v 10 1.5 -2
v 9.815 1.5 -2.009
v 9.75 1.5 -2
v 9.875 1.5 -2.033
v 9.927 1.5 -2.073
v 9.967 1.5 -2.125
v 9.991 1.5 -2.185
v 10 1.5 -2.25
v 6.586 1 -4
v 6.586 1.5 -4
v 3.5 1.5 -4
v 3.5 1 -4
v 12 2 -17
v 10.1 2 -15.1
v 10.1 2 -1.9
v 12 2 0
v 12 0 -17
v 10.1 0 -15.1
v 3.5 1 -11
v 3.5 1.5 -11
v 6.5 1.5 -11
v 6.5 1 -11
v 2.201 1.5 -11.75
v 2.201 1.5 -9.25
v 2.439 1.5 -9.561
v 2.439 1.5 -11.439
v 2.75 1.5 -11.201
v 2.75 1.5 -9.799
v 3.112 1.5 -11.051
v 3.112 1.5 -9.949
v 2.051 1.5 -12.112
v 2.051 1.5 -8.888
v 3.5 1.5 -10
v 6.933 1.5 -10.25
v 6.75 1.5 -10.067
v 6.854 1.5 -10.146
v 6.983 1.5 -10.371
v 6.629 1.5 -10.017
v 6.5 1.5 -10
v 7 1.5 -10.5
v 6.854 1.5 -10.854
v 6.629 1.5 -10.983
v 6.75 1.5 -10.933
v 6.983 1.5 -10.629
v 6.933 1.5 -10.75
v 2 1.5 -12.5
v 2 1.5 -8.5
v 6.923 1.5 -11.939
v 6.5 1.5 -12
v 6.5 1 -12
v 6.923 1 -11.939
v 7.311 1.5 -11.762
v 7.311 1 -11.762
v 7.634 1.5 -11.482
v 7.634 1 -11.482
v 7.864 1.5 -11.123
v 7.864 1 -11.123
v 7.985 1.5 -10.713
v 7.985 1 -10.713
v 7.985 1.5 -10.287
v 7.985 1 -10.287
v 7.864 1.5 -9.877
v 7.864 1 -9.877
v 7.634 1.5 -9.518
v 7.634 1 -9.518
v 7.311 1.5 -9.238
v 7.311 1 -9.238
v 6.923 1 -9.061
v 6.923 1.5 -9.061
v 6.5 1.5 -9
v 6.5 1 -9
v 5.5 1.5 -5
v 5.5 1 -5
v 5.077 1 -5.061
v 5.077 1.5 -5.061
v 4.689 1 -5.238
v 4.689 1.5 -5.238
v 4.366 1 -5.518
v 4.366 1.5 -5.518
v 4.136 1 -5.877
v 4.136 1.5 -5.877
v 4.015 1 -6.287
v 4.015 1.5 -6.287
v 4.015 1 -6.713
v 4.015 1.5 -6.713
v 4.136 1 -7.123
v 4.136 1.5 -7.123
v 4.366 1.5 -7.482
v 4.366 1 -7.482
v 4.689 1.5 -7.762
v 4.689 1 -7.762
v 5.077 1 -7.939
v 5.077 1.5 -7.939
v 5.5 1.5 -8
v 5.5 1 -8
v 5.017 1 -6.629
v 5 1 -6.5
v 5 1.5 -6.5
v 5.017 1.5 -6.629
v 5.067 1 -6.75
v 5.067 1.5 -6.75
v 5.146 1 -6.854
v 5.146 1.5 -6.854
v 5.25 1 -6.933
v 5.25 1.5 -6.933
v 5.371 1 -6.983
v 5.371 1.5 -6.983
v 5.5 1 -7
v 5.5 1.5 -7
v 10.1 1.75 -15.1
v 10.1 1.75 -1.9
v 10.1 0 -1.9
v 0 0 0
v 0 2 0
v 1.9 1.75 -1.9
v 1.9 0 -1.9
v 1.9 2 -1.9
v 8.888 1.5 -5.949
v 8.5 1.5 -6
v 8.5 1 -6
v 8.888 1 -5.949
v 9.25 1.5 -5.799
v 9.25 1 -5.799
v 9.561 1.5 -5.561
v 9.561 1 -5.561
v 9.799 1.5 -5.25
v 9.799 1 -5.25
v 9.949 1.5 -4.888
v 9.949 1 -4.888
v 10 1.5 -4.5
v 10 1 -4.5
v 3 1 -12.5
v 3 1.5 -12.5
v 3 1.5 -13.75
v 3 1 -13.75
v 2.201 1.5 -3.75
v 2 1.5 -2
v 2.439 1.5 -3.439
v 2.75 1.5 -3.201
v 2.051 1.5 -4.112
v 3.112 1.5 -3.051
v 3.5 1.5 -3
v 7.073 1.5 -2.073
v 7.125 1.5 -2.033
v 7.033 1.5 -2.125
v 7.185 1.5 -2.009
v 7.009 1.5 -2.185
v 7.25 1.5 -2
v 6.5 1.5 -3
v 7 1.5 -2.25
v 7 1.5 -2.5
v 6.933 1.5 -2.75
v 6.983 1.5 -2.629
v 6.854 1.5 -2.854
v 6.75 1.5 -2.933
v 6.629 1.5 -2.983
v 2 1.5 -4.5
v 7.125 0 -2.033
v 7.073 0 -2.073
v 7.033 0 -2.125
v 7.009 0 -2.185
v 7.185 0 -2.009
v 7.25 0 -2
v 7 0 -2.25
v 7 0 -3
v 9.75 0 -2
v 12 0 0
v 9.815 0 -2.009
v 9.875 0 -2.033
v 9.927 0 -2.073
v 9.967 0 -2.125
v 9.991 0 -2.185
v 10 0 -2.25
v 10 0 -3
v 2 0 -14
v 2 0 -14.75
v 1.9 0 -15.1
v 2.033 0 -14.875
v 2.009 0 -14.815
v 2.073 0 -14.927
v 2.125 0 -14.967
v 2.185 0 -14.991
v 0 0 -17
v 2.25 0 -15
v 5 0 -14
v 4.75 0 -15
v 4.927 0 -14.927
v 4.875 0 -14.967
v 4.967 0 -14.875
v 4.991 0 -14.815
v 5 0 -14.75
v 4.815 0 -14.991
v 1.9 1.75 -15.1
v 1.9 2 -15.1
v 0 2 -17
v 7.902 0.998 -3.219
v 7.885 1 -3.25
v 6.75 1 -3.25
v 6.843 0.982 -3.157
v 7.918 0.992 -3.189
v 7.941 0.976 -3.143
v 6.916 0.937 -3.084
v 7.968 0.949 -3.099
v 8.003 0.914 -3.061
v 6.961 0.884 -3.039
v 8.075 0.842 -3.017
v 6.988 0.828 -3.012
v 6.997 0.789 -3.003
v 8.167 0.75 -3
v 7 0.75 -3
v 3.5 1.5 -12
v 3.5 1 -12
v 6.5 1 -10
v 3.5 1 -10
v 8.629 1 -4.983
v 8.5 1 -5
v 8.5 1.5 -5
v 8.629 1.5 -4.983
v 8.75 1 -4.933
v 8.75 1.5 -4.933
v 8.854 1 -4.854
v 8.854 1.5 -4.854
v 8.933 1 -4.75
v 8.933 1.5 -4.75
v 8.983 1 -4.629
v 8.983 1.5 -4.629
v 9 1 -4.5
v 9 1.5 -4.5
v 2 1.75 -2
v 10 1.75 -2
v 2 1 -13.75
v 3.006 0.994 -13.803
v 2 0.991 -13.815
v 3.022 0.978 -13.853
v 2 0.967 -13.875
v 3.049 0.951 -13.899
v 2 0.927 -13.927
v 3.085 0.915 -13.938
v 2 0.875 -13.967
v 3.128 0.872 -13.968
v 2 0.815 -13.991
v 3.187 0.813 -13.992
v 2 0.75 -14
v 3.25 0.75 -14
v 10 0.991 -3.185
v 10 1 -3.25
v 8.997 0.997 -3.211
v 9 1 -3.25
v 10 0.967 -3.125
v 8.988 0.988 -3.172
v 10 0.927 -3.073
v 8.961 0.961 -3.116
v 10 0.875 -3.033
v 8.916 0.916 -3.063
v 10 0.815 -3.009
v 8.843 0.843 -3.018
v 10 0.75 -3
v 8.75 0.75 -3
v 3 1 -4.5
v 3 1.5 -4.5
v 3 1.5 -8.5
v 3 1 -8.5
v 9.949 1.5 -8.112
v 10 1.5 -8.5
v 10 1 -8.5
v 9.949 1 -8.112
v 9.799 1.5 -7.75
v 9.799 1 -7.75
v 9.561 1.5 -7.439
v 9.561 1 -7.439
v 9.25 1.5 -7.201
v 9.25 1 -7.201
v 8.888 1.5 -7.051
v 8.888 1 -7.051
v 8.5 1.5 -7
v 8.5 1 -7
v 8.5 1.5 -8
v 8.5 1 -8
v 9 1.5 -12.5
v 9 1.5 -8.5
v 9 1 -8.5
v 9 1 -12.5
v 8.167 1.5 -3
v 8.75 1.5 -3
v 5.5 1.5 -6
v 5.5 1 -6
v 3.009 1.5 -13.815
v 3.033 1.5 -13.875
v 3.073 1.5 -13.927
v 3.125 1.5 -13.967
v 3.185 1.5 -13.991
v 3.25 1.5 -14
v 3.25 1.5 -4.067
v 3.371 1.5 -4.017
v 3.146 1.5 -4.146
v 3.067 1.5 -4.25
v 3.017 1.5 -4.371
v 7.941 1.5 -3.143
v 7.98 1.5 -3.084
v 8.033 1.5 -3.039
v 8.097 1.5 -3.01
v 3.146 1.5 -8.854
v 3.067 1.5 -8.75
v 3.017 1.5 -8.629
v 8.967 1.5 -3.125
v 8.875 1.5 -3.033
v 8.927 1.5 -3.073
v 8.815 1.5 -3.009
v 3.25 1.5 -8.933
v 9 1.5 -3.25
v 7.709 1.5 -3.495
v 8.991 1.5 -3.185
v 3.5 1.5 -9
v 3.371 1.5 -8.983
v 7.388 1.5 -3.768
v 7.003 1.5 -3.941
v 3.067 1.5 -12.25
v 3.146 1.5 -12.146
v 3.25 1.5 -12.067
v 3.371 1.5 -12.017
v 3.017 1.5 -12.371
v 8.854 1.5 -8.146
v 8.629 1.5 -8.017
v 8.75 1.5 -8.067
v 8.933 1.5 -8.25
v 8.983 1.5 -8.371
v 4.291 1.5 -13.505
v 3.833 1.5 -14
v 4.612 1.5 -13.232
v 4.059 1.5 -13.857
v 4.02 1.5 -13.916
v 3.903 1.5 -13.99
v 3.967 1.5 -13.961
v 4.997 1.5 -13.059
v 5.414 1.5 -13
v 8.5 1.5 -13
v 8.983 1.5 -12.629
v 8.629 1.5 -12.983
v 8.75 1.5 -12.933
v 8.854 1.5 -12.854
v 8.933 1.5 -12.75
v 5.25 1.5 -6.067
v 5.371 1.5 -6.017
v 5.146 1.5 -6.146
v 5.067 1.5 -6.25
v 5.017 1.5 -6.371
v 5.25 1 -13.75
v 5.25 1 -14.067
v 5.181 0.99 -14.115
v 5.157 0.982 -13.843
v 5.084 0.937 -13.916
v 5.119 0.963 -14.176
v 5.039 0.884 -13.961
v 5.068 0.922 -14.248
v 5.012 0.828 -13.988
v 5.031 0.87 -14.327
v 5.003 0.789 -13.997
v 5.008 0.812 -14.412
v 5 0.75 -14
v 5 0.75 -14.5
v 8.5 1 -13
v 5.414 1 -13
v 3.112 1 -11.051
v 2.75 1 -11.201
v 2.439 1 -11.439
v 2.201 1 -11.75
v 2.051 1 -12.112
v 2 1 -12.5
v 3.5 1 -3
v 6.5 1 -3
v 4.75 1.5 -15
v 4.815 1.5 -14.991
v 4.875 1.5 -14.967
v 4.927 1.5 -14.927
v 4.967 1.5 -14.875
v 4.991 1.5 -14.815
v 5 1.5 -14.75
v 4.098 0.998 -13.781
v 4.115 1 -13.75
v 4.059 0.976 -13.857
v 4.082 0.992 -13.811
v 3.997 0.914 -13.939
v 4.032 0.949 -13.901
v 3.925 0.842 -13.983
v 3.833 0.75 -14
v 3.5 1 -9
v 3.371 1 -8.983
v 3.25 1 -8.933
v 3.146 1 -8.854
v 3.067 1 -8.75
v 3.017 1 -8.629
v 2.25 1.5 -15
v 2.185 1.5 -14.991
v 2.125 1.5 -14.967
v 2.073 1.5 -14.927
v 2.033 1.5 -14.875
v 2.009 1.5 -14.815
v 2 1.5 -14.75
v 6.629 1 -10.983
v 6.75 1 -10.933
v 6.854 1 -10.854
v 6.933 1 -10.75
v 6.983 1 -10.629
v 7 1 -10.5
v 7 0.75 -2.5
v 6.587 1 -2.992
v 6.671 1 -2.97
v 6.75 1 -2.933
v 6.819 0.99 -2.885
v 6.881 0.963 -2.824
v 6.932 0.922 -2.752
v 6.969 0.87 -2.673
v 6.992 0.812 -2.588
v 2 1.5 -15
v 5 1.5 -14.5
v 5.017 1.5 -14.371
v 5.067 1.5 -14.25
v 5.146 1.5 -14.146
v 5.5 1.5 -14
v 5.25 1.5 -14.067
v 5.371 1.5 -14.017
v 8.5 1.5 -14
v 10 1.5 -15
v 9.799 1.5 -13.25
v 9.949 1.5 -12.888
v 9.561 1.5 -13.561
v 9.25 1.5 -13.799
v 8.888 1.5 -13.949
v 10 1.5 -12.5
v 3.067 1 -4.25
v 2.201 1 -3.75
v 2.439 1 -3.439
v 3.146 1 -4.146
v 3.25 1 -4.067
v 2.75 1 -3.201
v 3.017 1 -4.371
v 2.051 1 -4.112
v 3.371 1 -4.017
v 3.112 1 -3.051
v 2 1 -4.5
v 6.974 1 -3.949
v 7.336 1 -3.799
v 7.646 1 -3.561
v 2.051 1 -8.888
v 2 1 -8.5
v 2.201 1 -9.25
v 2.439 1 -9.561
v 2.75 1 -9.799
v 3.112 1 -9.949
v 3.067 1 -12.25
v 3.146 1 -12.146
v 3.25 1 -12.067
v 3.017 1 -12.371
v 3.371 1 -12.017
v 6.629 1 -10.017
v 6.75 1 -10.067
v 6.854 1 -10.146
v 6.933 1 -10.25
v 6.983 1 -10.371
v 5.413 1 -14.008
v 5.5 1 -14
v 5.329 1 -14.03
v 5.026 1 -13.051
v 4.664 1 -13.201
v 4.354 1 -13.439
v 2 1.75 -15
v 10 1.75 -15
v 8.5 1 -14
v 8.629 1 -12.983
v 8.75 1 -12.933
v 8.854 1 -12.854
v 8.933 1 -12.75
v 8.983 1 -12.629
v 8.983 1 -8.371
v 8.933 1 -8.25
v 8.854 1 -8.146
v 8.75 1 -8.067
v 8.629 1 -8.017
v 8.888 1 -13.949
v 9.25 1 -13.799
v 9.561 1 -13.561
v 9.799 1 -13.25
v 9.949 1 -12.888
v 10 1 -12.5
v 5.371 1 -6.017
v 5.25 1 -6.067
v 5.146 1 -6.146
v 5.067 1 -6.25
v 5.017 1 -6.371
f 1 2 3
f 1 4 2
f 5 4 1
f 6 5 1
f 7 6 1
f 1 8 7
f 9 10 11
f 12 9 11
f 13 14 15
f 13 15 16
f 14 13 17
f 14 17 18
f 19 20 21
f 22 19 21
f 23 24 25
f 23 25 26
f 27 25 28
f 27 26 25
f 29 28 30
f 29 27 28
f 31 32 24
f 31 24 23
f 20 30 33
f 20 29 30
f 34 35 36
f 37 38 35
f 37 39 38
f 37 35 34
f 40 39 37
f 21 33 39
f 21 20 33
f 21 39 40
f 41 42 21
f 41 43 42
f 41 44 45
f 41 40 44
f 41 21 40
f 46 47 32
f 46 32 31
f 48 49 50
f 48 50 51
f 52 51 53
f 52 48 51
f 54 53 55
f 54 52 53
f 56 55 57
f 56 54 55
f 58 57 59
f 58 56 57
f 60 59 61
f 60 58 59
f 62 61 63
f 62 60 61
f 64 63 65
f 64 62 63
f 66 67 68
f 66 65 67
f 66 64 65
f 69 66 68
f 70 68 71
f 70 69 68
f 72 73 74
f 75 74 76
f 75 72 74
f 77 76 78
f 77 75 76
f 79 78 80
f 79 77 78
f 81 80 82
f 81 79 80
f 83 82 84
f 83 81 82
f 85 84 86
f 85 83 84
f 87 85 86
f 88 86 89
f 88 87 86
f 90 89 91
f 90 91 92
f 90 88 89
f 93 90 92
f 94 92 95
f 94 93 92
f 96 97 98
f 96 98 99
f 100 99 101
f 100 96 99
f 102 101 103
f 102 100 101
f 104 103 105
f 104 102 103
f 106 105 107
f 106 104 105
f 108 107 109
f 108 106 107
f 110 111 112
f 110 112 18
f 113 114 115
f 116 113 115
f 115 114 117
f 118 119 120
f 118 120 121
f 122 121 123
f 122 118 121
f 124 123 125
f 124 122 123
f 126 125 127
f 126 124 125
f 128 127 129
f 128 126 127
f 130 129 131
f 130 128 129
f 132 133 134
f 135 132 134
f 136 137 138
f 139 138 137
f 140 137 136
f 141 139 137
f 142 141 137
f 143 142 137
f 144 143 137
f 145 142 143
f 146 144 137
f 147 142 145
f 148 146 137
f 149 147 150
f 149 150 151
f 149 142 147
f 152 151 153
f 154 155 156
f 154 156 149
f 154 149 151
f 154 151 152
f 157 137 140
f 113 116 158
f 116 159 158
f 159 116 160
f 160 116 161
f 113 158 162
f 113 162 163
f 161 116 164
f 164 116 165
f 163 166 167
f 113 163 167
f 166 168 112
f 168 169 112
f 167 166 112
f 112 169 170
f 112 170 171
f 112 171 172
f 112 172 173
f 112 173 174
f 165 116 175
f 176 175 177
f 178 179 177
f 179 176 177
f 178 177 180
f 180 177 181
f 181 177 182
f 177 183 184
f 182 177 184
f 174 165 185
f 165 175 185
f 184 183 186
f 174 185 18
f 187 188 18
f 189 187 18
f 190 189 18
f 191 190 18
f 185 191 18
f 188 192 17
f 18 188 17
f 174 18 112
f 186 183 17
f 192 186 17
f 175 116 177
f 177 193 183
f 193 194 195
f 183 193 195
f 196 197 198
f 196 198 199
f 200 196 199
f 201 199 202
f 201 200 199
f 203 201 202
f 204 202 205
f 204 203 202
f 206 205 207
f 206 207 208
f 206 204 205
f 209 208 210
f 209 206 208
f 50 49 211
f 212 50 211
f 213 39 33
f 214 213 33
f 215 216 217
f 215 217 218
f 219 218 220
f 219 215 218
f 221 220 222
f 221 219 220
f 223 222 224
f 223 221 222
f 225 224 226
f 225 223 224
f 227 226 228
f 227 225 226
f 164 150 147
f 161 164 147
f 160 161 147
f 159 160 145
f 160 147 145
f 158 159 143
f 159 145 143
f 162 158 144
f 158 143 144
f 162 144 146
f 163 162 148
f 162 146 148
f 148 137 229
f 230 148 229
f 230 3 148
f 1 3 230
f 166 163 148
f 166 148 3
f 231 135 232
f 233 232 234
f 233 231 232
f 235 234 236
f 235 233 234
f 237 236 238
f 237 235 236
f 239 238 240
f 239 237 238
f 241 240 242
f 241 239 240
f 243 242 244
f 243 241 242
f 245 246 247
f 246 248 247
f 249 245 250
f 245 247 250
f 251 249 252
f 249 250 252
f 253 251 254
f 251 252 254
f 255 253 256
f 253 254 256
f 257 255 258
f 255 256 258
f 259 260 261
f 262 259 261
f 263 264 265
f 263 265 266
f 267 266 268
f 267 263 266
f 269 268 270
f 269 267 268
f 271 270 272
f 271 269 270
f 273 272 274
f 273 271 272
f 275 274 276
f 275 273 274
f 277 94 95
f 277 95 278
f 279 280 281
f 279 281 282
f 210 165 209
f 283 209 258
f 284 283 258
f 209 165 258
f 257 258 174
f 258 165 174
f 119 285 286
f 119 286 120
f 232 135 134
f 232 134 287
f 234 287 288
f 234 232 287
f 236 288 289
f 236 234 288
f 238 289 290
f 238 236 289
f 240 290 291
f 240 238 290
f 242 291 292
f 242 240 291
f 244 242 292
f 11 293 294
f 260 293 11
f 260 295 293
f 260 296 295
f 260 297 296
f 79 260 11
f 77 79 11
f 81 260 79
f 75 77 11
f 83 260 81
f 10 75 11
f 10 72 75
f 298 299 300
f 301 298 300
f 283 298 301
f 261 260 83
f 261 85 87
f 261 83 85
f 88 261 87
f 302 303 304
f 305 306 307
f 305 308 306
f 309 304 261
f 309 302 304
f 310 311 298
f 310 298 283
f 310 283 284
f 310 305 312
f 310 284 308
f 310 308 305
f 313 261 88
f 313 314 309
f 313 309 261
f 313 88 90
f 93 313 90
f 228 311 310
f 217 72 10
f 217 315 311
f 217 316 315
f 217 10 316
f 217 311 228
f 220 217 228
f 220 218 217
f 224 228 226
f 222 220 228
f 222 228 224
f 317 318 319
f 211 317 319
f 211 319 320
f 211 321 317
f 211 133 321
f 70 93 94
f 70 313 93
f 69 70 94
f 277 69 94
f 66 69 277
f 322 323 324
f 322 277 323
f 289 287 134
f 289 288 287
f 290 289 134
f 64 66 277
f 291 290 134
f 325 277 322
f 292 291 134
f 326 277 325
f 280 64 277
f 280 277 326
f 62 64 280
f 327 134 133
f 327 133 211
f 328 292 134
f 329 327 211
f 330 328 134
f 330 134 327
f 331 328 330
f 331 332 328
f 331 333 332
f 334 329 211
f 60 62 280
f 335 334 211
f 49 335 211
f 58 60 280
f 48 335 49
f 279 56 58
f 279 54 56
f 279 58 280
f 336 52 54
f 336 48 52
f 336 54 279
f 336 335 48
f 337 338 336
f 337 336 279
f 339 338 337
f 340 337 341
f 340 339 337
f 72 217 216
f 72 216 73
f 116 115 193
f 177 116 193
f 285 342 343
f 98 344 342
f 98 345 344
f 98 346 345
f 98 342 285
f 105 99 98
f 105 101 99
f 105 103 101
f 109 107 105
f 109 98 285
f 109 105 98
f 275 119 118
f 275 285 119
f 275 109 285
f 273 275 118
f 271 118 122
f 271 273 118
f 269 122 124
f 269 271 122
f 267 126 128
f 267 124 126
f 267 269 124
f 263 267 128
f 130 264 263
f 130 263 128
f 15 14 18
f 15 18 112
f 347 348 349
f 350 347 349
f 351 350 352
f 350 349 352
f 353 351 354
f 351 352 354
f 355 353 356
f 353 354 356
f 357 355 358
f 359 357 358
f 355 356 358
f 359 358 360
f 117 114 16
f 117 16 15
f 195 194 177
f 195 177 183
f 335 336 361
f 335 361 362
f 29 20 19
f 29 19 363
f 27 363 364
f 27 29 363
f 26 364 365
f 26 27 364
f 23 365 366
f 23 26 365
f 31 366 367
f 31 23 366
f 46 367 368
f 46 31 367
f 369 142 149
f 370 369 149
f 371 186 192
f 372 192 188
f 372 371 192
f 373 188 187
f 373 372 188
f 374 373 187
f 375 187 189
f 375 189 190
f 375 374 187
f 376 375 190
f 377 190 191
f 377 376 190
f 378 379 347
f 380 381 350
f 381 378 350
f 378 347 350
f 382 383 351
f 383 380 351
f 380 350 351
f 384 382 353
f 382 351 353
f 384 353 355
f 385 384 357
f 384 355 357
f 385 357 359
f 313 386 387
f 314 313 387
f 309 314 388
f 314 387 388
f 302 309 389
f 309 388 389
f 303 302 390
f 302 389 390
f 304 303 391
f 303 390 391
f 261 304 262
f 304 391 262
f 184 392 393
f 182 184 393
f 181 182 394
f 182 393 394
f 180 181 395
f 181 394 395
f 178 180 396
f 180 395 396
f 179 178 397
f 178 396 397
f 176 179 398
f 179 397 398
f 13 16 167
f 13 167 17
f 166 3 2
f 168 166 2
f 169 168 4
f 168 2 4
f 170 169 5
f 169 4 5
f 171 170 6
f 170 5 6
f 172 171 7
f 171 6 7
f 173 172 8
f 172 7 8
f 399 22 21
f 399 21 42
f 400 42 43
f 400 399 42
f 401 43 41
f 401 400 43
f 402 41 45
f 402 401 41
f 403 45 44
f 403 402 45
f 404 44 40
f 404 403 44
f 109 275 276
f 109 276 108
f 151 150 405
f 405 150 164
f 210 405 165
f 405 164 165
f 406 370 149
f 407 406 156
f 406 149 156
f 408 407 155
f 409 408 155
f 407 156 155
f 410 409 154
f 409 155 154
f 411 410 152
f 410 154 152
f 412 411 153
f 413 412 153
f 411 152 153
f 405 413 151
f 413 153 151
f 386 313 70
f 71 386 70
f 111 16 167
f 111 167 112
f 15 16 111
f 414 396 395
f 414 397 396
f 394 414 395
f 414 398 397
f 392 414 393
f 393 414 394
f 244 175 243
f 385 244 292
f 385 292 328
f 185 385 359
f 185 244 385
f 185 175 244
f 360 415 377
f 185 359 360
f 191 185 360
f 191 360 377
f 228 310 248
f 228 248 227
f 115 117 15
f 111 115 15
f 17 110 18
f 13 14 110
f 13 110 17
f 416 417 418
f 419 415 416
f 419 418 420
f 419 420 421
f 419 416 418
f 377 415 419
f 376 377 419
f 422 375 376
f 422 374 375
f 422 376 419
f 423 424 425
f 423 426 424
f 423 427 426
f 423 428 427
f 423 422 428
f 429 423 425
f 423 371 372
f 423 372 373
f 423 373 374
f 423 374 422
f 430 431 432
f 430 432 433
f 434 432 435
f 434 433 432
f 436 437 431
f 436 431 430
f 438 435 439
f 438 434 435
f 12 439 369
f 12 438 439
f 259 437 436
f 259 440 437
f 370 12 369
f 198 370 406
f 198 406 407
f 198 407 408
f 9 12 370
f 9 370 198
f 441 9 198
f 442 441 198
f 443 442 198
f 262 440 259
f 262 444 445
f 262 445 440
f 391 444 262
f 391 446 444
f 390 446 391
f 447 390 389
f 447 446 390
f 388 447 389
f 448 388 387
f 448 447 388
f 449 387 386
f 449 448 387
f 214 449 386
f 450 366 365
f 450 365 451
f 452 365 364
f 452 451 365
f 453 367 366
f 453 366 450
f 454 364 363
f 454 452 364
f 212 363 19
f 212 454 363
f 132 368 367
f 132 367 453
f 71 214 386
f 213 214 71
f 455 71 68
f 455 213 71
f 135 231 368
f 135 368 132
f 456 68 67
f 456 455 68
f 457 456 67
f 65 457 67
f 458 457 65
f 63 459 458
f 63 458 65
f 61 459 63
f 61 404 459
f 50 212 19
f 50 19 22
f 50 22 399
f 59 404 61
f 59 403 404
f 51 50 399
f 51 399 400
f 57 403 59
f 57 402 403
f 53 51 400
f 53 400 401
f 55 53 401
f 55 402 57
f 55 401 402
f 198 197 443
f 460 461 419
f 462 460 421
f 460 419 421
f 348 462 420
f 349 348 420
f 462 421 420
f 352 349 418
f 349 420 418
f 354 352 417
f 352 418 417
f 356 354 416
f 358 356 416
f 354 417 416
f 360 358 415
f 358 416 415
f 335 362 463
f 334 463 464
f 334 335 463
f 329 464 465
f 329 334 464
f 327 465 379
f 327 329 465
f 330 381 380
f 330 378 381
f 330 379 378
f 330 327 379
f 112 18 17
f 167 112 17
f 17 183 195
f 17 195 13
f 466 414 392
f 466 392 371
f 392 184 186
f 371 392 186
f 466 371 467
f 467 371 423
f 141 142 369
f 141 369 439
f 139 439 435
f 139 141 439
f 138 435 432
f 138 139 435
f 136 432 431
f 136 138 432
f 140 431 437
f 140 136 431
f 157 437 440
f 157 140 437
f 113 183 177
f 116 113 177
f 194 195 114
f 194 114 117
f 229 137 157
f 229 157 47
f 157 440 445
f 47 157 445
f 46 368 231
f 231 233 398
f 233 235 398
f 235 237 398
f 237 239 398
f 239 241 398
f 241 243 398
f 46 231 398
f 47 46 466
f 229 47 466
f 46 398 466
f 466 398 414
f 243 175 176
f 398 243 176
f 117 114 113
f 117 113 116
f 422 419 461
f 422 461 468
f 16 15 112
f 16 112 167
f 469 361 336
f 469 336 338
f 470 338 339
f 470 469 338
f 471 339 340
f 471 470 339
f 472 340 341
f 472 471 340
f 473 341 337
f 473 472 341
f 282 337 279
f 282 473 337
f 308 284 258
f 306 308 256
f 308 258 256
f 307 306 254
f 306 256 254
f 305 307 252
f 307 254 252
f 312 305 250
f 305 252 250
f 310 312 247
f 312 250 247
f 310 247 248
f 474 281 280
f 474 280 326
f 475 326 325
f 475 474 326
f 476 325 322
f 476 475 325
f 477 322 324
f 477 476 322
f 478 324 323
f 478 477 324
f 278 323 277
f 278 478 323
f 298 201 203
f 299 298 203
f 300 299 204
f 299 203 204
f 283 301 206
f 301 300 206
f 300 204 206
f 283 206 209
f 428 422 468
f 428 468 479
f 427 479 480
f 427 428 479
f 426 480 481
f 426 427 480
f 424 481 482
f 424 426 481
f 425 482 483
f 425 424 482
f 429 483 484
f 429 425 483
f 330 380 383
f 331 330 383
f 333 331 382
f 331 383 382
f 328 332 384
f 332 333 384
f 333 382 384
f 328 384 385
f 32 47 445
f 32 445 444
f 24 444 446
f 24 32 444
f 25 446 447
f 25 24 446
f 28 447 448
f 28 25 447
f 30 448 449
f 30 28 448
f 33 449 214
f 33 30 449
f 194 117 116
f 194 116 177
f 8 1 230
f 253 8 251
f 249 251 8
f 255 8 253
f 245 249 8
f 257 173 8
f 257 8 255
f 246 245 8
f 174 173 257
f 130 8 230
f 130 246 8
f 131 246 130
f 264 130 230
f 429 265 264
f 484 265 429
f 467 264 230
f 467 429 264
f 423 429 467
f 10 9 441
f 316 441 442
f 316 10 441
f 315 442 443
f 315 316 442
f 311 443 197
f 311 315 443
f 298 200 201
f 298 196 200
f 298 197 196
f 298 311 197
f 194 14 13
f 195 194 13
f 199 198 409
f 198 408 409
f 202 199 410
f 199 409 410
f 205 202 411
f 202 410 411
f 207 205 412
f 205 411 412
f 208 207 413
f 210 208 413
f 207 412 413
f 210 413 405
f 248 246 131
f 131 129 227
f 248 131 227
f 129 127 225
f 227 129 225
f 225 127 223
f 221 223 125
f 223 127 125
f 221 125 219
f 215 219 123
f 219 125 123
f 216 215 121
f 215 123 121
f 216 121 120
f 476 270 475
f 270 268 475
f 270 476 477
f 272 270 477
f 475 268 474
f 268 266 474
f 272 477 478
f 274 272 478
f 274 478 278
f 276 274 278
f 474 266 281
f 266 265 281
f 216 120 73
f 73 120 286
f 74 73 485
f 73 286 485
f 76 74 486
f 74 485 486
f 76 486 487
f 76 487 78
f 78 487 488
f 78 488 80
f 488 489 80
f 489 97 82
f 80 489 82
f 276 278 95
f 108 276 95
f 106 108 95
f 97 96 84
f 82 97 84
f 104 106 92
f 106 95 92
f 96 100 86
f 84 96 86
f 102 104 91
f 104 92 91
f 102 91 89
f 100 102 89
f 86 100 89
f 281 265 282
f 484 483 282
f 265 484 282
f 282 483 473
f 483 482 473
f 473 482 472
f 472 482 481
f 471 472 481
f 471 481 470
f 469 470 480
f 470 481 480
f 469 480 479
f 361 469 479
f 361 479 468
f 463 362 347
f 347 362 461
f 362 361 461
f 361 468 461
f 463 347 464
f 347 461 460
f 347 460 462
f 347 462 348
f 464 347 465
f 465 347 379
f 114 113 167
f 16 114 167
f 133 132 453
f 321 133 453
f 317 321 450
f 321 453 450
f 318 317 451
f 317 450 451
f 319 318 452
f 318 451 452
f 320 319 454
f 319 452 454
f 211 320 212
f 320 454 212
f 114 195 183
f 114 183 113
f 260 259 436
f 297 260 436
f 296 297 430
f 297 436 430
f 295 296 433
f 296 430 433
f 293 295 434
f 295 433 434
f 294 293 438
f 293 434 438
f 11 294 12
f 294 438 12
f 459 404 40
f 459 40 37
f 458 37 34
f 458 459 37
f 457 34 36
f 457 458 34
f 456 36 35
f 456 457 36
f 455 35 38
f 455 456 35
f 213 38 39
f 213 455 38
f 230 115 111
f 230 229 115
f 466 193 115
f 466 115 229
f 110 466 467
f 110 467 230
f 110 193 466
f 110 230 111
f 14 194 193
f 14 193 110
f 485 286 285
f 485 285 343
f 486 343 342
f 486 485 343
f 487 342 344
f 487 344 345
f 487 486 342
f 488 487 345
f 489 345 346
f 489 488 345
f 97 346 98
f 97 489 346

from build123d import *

# Parameters (mm, degrees)
SKIZZE1_W                            = 12
SKIZZE1_H                            = 17
AUFSATZ_LINEAR_AUSTRAGEN1_DEPTH      = 2
SCHNITT_LINEAR_AUSTRAGEN1_DEPTH      = 21.90454496
SCHNITT_LINEAR_AUSTRAGEN1_DEPTH_BACK = 21.90454496
SKIZZE4_W                            = 3
SKIZZE4_H                            = 1
SCHNITT_LINEAR_AUSTRAGEN3_DEPTH      = 1
VERRUNDUNG1_R                        = 0.5
VERRUNDUNG2_R                        = 1.5
VERRUNDUNG3_R                        = 0.25
SKIZZE2_W                            = 8
SKIZZE2_H                            = 13
SCHNITT_LINEAR_AUSTRAGEN4_DEPTH      = 0.5
SKIZZE6_W                            = 8.2
SKIZZE6_H                            = 13.2
SKIZZE6_W_2                          = 8
SKIZZE6_H_2                          = 13
SCHNITT_LINEAR_AUSTRAGEN5_DEPTH      = 0.25
SCHNITT_LINEAR_AUSTRAGEN6_DEPTH      = 21.90454496
AUFSATZ_LINEAR_AUSTRAGEN2_DEPTH      = 2
AUFSATZ_LINEAR_AUSTRAGEN2_2_DEPTH    = 2


# Some blends are built 0.0001 mm under size
with BuildPart() as part:
    # Skizze1 → Aufsatz-Linear austragen1 (new body)
    with BuildSketch(Plane(origin=(0, 0, 0), x_dir=(1, 0, 0), z_dir=(0, 1, 0))):
        with Locations((6, 8.5)):
            Rectangle(SKIZZE1_W, SKIZZE1_H)
    extrude(amount=AUFSATZ_LINEAR_AUSTRAGEN1_DEPTH)

    # Skizze4 → Schnitt-Linear austragen1 (cut, two sides: drawn at the far end of the back side and taken through both)
    with BuildSketch(Plane(origin=(0, 2, 0), x_dir=(1, 0, 0), z_dir=(0, 1, 0)).offset(-SCHNITT_LINEAR_AUSTRAGEN1_DEPTH_BACK)):
        with Locations((8.5, 2.5)):
            Rectangle(SKIZZE4_W, SKIZZE4_H)
        with Locations((3.5, 14.5)):
            Rectangle(SKIZZE4_W, SKIZZE4_H)
    extrude(amount=SCHNITT_LINEAR_AUSTRAGEN1_DEPTH + SCHNITT_LINEAR_AUSTRAGEN1_DEPTH_BACK, mode=Mode.SUBTRACT)

    # Skizze3 → Schnitt-Linear austragen3 (cut)
    with BuildSketch(Plane(origin=(0, 2, 0), x_dir=(1, 0, 0), z_dir=(0, 1, 0))):
        Polygon((8, 4), (3, 4), (3, 9), (8, 9), (8, 12), (3, 12), (3, 14), (2, 14), (2, 11), (7, 11), (7, 10), (2, 10), (2, 3), (8, 3), align=None)
        Polygon((9, 5), (4, 5), (4, 8), (9, 8), (9, 13), (4, 13), (4, 14), (10, 14), (10, 7), (5, 7), (5, 6), (10, 6), (10, 3), (9, 3), align=None)
    extrude(amount=-SCHNITT_LINEAR_AUSTRAGEN3_DEPTH, mode=Mode.SUBTRACT)

    # Verrundung1
    verrundung1_edges = [part.edges().sort_by_distance(p)[0] for p in [
        (3, 1.5, -12),
        (3, 1.5, -9),
        (7, 1.5, -3),
        (5, 1.5, -14),
        (9, 1.5, -5),
        (9, 1.5, -8),
        (9, 1.5, -13),
        (5, 1.5, -7),
        (5, 1.5, -6),
        (3, 1.5, -4),
        (7, 1.5, -10),
        (7, 1.5, -11),
    ]]
    fillet(verrundung1_edges, radius=VERRUNDUNG1_R - 0.0001)  # a hair under: the kernel refuses the full size

    # Verrundung2
    # the kernel refuses this fillet: 1.5 mm, written as the material it adds along each edge
    with BuildSketch(Plane(origin=(4, 2, -8), x_dir=(0, 0, 1), z_dir=(0, -1, 0)), Plane(origin=(2, 2, -11), x_dir=(1, 0, 0), z_dir=(0, -1, 0)), Plane(origin=(2, 2, -3), x_dir=(1, 0, 0), z_dir=(0, -1, 0)), Plane(origin=(2, 2, -10), x_dir=(0, 0, 1), z_dir=(0, -1, 0)), Plane(origin=(4, 2, -5), x_dir=(1, 0, 0), z_dir=(0, -1, 0))) as verrundung2_piece_1:
        with BuildLine():
            CenterArc((VERRUNDUNG2_R, -VERRUNDUNG2_R), VERRUNDUNG2_R, 90, 90)
            Line((0, -VERRUNDUNG2_R), (-VERRUNDUNG2_R * 0.02, -VERRUNDUNG2_R))
            Line((-VERRUNDUNG2_R * 0.02, -VERRUNDUNG2_R), (-VERRUNDUNG2_R * 0.02, VERRUNDUNG2_R * 0.02))
            Line((-VERRUNDUNG2_R * 0.02, VERRUNDUNG2_R * 0.02), (VERRUNDUNG2_R, VERRUNDUNG2_R * 0.02))
            Line((VERRUNDUNG2_R, VERRUNDUNG2_R * 0.02), (VERRUNDUNG2_R, 0))
        make_face()
    extrude(amount=1)
    with BuildSketch(Plane(origin=(8, 2, -4), x_dir=(-1, 0, 0), z_dir=(0, -1, 0)), Plane(origin=(4, 2, -13), x_dir=(1, 0, 0), z_dir=(0, -1, 0))) as verrundung2_piece_2:
        with BuildLine():
            CenterArc((1.414213562, -1.5), VERRUNDUNG2_R, 90, 70.528779366)
            Line((0, -1), (-0.028284271, -0.99))
            ThreePointArc((-0.028284271, -0.99), (-0.03, -0.5), (-0.03, 0))
            Line((-0.03, 0), (0, 0.03))
            Line((0, 0.03), (1.414213562, 0.03))
            Line((1.414213562, 0.03), (1.414213562, 0))
        make_face()
    extrude(amount=1)
    with BuildSketch(Plane(origin=(10, 2, -14), x_dir=(0, 0, 1), z_dir=(0, -1, 0)), Plane(origin=(10, 2, -7), x_dir=(-1, 0, 0), z_dir=(0, -1, 0)), Plane(origin=(10, 2, -6), x_dir=(0, 0, 1), z_dir=(0, -1, 0)), Plane(origin=(8, 2, -12), x_dir=(0, 0, 1), z_dir=(0, -1, 0)), Plane(origin=(8, 2, -9), x_dir=(-1, 0, 0), z_dir=(0, -1, 0))) as verrundung2_piece_3:
        with BuildLine():
            CenterArc((VERRUNDUNG2_R, VERRUNDUNG2_R), VERRUNDUNG2_R, 180, 90)
            Line((0, VERRUNDUNG2_R), (-VERRUNDUNG2_R * 0.02, VERRUNDUNG2_R))
            Line((-VERRUNDUNG2_R * 0.02, VERRUNDUNG2_R), (-VERRUNDUNG2_R * 0.02, -VERRUNDUNG2_R * 0.02))
            Line((-VERRUNDUNG2_R * 0.02, -VERRUNDUNG2_R * 0.02), (VERRUNDUNG2_R, -VERRUNDUNG2_R * 0.02))
            Line((VERRUNDUNG2_R, -VERRUNDUNG2_R * 0.02), (VERRUNDUNG2_R, 0))
        make_face()
    extrude(amount=1)

    # Verrundung3
    verrundung3_edges = [part.edges().sort_by_distance(p)[0] for p in [
        (3, 1.5, -14),
        (2.5, 1, -14),
        (5, 1, -14.24995),
        (7, 1, -2.75005),
        (10, 1, -2),
        (7, 1, -2),
        (2, 1, -15),
        (5, 1, -15),
        (4, 1.5, -14),
        (9, 1.5, -3),
        (4.5, 1, -14),
        (9.5, 1, -3),
        (7.5, 1, -3),
        (8, 1.5, -3),
    ]]
    fillet(verrundung3_edges, radius=VERRUNDUNG3_R)

    # Skizze2 → Schnitt-Linear austragen4 (cut)
    with BuildSketch(Plane(origin=(0, 2, 0), x_dir=(1, 0, 0), z_dir=(0, 1, 0))):
        with Locations((6, 8.5)):
            Rectangle(SKIZZE2_W, SKIZZE2_H)
    extrude(amount=-SCHNITT_LINEAR_AUSTRAGEN4_DEPTH, mode=Mode.SUBTRACT)

    # Skizze6 → Schnitt-Linear austragen5 (cut)
    with BuildSketch(Plane(origin=(0, 2, 0), x_dir=(1, 0, 0), z_dir=(0, 1, 0))):
        with Locations((6, 8.5)):
            Rectangle(SKIZZE6_W, SKIZZE6_H)
        with Locations((6, 8.5)):
            Rectangle(SKIZZE6_W_2, SKIZZE6_H_2, mode=Mode.SUBTRACT)
    extrude(amount=-SCHNITT_LINEAR_AUSTRAGEN5_DEPTH, mode=Mode.SUBTRACT)

    # Skizze7 → Schnitt-Linear austragen6 (cut, through all)
    with BuildSketch(Plane(origin=(0, 2, 0), x_dir=(1, 0, 0), z_dir=(0, 1, 0))):
        Polygon((1.9, 15.1), (0, 17), (0, 0), (1.9, 1.9), align=None)
        Polygon((10.1, 15.1), (12, 17), (12, 0), (10.1, 1.9), align=None)
    extrude(amount=-SCHNITT_LINEAR_AUSTRAGEN6_DEPTH, mode=Mode.SUBTRACT)


with BuildPart() as body_2:
    # Skizze8 → Aufsatz-Linear austragen2 (new body)
    with BuildSketch(Plane(origin=(0, 2, 0), x_dir=(1, 0, 0), z_dir=(0, 1, 0))):
        Polygon((0, 17), (0, 0), (1.9, 1.9), (1.9, 15.1), align=None)
    extrude(amount=-AUFSATZ_LINEAR_AUSTRAGEN2_DEPTH)


with BuildPart() as body_3:
    # Skizze8 → Aufsatz-Linear austragen2 2 (new body)
    with BuildSketch(Plane(origin=(0, 2, 0), x_dir=(1, 0, 0), z_dir=(0, 1, 0))):
        Polygon((10.1, 15.1), (10.1, 1.9), (12, 0), (12, 17), align=None)
    extrude(amount=-AUFSATZ_LINEAR_AUSTRAGEN2_2_DEPTH)


solid = Compound([part.part, body_2.part, body_3.part])
